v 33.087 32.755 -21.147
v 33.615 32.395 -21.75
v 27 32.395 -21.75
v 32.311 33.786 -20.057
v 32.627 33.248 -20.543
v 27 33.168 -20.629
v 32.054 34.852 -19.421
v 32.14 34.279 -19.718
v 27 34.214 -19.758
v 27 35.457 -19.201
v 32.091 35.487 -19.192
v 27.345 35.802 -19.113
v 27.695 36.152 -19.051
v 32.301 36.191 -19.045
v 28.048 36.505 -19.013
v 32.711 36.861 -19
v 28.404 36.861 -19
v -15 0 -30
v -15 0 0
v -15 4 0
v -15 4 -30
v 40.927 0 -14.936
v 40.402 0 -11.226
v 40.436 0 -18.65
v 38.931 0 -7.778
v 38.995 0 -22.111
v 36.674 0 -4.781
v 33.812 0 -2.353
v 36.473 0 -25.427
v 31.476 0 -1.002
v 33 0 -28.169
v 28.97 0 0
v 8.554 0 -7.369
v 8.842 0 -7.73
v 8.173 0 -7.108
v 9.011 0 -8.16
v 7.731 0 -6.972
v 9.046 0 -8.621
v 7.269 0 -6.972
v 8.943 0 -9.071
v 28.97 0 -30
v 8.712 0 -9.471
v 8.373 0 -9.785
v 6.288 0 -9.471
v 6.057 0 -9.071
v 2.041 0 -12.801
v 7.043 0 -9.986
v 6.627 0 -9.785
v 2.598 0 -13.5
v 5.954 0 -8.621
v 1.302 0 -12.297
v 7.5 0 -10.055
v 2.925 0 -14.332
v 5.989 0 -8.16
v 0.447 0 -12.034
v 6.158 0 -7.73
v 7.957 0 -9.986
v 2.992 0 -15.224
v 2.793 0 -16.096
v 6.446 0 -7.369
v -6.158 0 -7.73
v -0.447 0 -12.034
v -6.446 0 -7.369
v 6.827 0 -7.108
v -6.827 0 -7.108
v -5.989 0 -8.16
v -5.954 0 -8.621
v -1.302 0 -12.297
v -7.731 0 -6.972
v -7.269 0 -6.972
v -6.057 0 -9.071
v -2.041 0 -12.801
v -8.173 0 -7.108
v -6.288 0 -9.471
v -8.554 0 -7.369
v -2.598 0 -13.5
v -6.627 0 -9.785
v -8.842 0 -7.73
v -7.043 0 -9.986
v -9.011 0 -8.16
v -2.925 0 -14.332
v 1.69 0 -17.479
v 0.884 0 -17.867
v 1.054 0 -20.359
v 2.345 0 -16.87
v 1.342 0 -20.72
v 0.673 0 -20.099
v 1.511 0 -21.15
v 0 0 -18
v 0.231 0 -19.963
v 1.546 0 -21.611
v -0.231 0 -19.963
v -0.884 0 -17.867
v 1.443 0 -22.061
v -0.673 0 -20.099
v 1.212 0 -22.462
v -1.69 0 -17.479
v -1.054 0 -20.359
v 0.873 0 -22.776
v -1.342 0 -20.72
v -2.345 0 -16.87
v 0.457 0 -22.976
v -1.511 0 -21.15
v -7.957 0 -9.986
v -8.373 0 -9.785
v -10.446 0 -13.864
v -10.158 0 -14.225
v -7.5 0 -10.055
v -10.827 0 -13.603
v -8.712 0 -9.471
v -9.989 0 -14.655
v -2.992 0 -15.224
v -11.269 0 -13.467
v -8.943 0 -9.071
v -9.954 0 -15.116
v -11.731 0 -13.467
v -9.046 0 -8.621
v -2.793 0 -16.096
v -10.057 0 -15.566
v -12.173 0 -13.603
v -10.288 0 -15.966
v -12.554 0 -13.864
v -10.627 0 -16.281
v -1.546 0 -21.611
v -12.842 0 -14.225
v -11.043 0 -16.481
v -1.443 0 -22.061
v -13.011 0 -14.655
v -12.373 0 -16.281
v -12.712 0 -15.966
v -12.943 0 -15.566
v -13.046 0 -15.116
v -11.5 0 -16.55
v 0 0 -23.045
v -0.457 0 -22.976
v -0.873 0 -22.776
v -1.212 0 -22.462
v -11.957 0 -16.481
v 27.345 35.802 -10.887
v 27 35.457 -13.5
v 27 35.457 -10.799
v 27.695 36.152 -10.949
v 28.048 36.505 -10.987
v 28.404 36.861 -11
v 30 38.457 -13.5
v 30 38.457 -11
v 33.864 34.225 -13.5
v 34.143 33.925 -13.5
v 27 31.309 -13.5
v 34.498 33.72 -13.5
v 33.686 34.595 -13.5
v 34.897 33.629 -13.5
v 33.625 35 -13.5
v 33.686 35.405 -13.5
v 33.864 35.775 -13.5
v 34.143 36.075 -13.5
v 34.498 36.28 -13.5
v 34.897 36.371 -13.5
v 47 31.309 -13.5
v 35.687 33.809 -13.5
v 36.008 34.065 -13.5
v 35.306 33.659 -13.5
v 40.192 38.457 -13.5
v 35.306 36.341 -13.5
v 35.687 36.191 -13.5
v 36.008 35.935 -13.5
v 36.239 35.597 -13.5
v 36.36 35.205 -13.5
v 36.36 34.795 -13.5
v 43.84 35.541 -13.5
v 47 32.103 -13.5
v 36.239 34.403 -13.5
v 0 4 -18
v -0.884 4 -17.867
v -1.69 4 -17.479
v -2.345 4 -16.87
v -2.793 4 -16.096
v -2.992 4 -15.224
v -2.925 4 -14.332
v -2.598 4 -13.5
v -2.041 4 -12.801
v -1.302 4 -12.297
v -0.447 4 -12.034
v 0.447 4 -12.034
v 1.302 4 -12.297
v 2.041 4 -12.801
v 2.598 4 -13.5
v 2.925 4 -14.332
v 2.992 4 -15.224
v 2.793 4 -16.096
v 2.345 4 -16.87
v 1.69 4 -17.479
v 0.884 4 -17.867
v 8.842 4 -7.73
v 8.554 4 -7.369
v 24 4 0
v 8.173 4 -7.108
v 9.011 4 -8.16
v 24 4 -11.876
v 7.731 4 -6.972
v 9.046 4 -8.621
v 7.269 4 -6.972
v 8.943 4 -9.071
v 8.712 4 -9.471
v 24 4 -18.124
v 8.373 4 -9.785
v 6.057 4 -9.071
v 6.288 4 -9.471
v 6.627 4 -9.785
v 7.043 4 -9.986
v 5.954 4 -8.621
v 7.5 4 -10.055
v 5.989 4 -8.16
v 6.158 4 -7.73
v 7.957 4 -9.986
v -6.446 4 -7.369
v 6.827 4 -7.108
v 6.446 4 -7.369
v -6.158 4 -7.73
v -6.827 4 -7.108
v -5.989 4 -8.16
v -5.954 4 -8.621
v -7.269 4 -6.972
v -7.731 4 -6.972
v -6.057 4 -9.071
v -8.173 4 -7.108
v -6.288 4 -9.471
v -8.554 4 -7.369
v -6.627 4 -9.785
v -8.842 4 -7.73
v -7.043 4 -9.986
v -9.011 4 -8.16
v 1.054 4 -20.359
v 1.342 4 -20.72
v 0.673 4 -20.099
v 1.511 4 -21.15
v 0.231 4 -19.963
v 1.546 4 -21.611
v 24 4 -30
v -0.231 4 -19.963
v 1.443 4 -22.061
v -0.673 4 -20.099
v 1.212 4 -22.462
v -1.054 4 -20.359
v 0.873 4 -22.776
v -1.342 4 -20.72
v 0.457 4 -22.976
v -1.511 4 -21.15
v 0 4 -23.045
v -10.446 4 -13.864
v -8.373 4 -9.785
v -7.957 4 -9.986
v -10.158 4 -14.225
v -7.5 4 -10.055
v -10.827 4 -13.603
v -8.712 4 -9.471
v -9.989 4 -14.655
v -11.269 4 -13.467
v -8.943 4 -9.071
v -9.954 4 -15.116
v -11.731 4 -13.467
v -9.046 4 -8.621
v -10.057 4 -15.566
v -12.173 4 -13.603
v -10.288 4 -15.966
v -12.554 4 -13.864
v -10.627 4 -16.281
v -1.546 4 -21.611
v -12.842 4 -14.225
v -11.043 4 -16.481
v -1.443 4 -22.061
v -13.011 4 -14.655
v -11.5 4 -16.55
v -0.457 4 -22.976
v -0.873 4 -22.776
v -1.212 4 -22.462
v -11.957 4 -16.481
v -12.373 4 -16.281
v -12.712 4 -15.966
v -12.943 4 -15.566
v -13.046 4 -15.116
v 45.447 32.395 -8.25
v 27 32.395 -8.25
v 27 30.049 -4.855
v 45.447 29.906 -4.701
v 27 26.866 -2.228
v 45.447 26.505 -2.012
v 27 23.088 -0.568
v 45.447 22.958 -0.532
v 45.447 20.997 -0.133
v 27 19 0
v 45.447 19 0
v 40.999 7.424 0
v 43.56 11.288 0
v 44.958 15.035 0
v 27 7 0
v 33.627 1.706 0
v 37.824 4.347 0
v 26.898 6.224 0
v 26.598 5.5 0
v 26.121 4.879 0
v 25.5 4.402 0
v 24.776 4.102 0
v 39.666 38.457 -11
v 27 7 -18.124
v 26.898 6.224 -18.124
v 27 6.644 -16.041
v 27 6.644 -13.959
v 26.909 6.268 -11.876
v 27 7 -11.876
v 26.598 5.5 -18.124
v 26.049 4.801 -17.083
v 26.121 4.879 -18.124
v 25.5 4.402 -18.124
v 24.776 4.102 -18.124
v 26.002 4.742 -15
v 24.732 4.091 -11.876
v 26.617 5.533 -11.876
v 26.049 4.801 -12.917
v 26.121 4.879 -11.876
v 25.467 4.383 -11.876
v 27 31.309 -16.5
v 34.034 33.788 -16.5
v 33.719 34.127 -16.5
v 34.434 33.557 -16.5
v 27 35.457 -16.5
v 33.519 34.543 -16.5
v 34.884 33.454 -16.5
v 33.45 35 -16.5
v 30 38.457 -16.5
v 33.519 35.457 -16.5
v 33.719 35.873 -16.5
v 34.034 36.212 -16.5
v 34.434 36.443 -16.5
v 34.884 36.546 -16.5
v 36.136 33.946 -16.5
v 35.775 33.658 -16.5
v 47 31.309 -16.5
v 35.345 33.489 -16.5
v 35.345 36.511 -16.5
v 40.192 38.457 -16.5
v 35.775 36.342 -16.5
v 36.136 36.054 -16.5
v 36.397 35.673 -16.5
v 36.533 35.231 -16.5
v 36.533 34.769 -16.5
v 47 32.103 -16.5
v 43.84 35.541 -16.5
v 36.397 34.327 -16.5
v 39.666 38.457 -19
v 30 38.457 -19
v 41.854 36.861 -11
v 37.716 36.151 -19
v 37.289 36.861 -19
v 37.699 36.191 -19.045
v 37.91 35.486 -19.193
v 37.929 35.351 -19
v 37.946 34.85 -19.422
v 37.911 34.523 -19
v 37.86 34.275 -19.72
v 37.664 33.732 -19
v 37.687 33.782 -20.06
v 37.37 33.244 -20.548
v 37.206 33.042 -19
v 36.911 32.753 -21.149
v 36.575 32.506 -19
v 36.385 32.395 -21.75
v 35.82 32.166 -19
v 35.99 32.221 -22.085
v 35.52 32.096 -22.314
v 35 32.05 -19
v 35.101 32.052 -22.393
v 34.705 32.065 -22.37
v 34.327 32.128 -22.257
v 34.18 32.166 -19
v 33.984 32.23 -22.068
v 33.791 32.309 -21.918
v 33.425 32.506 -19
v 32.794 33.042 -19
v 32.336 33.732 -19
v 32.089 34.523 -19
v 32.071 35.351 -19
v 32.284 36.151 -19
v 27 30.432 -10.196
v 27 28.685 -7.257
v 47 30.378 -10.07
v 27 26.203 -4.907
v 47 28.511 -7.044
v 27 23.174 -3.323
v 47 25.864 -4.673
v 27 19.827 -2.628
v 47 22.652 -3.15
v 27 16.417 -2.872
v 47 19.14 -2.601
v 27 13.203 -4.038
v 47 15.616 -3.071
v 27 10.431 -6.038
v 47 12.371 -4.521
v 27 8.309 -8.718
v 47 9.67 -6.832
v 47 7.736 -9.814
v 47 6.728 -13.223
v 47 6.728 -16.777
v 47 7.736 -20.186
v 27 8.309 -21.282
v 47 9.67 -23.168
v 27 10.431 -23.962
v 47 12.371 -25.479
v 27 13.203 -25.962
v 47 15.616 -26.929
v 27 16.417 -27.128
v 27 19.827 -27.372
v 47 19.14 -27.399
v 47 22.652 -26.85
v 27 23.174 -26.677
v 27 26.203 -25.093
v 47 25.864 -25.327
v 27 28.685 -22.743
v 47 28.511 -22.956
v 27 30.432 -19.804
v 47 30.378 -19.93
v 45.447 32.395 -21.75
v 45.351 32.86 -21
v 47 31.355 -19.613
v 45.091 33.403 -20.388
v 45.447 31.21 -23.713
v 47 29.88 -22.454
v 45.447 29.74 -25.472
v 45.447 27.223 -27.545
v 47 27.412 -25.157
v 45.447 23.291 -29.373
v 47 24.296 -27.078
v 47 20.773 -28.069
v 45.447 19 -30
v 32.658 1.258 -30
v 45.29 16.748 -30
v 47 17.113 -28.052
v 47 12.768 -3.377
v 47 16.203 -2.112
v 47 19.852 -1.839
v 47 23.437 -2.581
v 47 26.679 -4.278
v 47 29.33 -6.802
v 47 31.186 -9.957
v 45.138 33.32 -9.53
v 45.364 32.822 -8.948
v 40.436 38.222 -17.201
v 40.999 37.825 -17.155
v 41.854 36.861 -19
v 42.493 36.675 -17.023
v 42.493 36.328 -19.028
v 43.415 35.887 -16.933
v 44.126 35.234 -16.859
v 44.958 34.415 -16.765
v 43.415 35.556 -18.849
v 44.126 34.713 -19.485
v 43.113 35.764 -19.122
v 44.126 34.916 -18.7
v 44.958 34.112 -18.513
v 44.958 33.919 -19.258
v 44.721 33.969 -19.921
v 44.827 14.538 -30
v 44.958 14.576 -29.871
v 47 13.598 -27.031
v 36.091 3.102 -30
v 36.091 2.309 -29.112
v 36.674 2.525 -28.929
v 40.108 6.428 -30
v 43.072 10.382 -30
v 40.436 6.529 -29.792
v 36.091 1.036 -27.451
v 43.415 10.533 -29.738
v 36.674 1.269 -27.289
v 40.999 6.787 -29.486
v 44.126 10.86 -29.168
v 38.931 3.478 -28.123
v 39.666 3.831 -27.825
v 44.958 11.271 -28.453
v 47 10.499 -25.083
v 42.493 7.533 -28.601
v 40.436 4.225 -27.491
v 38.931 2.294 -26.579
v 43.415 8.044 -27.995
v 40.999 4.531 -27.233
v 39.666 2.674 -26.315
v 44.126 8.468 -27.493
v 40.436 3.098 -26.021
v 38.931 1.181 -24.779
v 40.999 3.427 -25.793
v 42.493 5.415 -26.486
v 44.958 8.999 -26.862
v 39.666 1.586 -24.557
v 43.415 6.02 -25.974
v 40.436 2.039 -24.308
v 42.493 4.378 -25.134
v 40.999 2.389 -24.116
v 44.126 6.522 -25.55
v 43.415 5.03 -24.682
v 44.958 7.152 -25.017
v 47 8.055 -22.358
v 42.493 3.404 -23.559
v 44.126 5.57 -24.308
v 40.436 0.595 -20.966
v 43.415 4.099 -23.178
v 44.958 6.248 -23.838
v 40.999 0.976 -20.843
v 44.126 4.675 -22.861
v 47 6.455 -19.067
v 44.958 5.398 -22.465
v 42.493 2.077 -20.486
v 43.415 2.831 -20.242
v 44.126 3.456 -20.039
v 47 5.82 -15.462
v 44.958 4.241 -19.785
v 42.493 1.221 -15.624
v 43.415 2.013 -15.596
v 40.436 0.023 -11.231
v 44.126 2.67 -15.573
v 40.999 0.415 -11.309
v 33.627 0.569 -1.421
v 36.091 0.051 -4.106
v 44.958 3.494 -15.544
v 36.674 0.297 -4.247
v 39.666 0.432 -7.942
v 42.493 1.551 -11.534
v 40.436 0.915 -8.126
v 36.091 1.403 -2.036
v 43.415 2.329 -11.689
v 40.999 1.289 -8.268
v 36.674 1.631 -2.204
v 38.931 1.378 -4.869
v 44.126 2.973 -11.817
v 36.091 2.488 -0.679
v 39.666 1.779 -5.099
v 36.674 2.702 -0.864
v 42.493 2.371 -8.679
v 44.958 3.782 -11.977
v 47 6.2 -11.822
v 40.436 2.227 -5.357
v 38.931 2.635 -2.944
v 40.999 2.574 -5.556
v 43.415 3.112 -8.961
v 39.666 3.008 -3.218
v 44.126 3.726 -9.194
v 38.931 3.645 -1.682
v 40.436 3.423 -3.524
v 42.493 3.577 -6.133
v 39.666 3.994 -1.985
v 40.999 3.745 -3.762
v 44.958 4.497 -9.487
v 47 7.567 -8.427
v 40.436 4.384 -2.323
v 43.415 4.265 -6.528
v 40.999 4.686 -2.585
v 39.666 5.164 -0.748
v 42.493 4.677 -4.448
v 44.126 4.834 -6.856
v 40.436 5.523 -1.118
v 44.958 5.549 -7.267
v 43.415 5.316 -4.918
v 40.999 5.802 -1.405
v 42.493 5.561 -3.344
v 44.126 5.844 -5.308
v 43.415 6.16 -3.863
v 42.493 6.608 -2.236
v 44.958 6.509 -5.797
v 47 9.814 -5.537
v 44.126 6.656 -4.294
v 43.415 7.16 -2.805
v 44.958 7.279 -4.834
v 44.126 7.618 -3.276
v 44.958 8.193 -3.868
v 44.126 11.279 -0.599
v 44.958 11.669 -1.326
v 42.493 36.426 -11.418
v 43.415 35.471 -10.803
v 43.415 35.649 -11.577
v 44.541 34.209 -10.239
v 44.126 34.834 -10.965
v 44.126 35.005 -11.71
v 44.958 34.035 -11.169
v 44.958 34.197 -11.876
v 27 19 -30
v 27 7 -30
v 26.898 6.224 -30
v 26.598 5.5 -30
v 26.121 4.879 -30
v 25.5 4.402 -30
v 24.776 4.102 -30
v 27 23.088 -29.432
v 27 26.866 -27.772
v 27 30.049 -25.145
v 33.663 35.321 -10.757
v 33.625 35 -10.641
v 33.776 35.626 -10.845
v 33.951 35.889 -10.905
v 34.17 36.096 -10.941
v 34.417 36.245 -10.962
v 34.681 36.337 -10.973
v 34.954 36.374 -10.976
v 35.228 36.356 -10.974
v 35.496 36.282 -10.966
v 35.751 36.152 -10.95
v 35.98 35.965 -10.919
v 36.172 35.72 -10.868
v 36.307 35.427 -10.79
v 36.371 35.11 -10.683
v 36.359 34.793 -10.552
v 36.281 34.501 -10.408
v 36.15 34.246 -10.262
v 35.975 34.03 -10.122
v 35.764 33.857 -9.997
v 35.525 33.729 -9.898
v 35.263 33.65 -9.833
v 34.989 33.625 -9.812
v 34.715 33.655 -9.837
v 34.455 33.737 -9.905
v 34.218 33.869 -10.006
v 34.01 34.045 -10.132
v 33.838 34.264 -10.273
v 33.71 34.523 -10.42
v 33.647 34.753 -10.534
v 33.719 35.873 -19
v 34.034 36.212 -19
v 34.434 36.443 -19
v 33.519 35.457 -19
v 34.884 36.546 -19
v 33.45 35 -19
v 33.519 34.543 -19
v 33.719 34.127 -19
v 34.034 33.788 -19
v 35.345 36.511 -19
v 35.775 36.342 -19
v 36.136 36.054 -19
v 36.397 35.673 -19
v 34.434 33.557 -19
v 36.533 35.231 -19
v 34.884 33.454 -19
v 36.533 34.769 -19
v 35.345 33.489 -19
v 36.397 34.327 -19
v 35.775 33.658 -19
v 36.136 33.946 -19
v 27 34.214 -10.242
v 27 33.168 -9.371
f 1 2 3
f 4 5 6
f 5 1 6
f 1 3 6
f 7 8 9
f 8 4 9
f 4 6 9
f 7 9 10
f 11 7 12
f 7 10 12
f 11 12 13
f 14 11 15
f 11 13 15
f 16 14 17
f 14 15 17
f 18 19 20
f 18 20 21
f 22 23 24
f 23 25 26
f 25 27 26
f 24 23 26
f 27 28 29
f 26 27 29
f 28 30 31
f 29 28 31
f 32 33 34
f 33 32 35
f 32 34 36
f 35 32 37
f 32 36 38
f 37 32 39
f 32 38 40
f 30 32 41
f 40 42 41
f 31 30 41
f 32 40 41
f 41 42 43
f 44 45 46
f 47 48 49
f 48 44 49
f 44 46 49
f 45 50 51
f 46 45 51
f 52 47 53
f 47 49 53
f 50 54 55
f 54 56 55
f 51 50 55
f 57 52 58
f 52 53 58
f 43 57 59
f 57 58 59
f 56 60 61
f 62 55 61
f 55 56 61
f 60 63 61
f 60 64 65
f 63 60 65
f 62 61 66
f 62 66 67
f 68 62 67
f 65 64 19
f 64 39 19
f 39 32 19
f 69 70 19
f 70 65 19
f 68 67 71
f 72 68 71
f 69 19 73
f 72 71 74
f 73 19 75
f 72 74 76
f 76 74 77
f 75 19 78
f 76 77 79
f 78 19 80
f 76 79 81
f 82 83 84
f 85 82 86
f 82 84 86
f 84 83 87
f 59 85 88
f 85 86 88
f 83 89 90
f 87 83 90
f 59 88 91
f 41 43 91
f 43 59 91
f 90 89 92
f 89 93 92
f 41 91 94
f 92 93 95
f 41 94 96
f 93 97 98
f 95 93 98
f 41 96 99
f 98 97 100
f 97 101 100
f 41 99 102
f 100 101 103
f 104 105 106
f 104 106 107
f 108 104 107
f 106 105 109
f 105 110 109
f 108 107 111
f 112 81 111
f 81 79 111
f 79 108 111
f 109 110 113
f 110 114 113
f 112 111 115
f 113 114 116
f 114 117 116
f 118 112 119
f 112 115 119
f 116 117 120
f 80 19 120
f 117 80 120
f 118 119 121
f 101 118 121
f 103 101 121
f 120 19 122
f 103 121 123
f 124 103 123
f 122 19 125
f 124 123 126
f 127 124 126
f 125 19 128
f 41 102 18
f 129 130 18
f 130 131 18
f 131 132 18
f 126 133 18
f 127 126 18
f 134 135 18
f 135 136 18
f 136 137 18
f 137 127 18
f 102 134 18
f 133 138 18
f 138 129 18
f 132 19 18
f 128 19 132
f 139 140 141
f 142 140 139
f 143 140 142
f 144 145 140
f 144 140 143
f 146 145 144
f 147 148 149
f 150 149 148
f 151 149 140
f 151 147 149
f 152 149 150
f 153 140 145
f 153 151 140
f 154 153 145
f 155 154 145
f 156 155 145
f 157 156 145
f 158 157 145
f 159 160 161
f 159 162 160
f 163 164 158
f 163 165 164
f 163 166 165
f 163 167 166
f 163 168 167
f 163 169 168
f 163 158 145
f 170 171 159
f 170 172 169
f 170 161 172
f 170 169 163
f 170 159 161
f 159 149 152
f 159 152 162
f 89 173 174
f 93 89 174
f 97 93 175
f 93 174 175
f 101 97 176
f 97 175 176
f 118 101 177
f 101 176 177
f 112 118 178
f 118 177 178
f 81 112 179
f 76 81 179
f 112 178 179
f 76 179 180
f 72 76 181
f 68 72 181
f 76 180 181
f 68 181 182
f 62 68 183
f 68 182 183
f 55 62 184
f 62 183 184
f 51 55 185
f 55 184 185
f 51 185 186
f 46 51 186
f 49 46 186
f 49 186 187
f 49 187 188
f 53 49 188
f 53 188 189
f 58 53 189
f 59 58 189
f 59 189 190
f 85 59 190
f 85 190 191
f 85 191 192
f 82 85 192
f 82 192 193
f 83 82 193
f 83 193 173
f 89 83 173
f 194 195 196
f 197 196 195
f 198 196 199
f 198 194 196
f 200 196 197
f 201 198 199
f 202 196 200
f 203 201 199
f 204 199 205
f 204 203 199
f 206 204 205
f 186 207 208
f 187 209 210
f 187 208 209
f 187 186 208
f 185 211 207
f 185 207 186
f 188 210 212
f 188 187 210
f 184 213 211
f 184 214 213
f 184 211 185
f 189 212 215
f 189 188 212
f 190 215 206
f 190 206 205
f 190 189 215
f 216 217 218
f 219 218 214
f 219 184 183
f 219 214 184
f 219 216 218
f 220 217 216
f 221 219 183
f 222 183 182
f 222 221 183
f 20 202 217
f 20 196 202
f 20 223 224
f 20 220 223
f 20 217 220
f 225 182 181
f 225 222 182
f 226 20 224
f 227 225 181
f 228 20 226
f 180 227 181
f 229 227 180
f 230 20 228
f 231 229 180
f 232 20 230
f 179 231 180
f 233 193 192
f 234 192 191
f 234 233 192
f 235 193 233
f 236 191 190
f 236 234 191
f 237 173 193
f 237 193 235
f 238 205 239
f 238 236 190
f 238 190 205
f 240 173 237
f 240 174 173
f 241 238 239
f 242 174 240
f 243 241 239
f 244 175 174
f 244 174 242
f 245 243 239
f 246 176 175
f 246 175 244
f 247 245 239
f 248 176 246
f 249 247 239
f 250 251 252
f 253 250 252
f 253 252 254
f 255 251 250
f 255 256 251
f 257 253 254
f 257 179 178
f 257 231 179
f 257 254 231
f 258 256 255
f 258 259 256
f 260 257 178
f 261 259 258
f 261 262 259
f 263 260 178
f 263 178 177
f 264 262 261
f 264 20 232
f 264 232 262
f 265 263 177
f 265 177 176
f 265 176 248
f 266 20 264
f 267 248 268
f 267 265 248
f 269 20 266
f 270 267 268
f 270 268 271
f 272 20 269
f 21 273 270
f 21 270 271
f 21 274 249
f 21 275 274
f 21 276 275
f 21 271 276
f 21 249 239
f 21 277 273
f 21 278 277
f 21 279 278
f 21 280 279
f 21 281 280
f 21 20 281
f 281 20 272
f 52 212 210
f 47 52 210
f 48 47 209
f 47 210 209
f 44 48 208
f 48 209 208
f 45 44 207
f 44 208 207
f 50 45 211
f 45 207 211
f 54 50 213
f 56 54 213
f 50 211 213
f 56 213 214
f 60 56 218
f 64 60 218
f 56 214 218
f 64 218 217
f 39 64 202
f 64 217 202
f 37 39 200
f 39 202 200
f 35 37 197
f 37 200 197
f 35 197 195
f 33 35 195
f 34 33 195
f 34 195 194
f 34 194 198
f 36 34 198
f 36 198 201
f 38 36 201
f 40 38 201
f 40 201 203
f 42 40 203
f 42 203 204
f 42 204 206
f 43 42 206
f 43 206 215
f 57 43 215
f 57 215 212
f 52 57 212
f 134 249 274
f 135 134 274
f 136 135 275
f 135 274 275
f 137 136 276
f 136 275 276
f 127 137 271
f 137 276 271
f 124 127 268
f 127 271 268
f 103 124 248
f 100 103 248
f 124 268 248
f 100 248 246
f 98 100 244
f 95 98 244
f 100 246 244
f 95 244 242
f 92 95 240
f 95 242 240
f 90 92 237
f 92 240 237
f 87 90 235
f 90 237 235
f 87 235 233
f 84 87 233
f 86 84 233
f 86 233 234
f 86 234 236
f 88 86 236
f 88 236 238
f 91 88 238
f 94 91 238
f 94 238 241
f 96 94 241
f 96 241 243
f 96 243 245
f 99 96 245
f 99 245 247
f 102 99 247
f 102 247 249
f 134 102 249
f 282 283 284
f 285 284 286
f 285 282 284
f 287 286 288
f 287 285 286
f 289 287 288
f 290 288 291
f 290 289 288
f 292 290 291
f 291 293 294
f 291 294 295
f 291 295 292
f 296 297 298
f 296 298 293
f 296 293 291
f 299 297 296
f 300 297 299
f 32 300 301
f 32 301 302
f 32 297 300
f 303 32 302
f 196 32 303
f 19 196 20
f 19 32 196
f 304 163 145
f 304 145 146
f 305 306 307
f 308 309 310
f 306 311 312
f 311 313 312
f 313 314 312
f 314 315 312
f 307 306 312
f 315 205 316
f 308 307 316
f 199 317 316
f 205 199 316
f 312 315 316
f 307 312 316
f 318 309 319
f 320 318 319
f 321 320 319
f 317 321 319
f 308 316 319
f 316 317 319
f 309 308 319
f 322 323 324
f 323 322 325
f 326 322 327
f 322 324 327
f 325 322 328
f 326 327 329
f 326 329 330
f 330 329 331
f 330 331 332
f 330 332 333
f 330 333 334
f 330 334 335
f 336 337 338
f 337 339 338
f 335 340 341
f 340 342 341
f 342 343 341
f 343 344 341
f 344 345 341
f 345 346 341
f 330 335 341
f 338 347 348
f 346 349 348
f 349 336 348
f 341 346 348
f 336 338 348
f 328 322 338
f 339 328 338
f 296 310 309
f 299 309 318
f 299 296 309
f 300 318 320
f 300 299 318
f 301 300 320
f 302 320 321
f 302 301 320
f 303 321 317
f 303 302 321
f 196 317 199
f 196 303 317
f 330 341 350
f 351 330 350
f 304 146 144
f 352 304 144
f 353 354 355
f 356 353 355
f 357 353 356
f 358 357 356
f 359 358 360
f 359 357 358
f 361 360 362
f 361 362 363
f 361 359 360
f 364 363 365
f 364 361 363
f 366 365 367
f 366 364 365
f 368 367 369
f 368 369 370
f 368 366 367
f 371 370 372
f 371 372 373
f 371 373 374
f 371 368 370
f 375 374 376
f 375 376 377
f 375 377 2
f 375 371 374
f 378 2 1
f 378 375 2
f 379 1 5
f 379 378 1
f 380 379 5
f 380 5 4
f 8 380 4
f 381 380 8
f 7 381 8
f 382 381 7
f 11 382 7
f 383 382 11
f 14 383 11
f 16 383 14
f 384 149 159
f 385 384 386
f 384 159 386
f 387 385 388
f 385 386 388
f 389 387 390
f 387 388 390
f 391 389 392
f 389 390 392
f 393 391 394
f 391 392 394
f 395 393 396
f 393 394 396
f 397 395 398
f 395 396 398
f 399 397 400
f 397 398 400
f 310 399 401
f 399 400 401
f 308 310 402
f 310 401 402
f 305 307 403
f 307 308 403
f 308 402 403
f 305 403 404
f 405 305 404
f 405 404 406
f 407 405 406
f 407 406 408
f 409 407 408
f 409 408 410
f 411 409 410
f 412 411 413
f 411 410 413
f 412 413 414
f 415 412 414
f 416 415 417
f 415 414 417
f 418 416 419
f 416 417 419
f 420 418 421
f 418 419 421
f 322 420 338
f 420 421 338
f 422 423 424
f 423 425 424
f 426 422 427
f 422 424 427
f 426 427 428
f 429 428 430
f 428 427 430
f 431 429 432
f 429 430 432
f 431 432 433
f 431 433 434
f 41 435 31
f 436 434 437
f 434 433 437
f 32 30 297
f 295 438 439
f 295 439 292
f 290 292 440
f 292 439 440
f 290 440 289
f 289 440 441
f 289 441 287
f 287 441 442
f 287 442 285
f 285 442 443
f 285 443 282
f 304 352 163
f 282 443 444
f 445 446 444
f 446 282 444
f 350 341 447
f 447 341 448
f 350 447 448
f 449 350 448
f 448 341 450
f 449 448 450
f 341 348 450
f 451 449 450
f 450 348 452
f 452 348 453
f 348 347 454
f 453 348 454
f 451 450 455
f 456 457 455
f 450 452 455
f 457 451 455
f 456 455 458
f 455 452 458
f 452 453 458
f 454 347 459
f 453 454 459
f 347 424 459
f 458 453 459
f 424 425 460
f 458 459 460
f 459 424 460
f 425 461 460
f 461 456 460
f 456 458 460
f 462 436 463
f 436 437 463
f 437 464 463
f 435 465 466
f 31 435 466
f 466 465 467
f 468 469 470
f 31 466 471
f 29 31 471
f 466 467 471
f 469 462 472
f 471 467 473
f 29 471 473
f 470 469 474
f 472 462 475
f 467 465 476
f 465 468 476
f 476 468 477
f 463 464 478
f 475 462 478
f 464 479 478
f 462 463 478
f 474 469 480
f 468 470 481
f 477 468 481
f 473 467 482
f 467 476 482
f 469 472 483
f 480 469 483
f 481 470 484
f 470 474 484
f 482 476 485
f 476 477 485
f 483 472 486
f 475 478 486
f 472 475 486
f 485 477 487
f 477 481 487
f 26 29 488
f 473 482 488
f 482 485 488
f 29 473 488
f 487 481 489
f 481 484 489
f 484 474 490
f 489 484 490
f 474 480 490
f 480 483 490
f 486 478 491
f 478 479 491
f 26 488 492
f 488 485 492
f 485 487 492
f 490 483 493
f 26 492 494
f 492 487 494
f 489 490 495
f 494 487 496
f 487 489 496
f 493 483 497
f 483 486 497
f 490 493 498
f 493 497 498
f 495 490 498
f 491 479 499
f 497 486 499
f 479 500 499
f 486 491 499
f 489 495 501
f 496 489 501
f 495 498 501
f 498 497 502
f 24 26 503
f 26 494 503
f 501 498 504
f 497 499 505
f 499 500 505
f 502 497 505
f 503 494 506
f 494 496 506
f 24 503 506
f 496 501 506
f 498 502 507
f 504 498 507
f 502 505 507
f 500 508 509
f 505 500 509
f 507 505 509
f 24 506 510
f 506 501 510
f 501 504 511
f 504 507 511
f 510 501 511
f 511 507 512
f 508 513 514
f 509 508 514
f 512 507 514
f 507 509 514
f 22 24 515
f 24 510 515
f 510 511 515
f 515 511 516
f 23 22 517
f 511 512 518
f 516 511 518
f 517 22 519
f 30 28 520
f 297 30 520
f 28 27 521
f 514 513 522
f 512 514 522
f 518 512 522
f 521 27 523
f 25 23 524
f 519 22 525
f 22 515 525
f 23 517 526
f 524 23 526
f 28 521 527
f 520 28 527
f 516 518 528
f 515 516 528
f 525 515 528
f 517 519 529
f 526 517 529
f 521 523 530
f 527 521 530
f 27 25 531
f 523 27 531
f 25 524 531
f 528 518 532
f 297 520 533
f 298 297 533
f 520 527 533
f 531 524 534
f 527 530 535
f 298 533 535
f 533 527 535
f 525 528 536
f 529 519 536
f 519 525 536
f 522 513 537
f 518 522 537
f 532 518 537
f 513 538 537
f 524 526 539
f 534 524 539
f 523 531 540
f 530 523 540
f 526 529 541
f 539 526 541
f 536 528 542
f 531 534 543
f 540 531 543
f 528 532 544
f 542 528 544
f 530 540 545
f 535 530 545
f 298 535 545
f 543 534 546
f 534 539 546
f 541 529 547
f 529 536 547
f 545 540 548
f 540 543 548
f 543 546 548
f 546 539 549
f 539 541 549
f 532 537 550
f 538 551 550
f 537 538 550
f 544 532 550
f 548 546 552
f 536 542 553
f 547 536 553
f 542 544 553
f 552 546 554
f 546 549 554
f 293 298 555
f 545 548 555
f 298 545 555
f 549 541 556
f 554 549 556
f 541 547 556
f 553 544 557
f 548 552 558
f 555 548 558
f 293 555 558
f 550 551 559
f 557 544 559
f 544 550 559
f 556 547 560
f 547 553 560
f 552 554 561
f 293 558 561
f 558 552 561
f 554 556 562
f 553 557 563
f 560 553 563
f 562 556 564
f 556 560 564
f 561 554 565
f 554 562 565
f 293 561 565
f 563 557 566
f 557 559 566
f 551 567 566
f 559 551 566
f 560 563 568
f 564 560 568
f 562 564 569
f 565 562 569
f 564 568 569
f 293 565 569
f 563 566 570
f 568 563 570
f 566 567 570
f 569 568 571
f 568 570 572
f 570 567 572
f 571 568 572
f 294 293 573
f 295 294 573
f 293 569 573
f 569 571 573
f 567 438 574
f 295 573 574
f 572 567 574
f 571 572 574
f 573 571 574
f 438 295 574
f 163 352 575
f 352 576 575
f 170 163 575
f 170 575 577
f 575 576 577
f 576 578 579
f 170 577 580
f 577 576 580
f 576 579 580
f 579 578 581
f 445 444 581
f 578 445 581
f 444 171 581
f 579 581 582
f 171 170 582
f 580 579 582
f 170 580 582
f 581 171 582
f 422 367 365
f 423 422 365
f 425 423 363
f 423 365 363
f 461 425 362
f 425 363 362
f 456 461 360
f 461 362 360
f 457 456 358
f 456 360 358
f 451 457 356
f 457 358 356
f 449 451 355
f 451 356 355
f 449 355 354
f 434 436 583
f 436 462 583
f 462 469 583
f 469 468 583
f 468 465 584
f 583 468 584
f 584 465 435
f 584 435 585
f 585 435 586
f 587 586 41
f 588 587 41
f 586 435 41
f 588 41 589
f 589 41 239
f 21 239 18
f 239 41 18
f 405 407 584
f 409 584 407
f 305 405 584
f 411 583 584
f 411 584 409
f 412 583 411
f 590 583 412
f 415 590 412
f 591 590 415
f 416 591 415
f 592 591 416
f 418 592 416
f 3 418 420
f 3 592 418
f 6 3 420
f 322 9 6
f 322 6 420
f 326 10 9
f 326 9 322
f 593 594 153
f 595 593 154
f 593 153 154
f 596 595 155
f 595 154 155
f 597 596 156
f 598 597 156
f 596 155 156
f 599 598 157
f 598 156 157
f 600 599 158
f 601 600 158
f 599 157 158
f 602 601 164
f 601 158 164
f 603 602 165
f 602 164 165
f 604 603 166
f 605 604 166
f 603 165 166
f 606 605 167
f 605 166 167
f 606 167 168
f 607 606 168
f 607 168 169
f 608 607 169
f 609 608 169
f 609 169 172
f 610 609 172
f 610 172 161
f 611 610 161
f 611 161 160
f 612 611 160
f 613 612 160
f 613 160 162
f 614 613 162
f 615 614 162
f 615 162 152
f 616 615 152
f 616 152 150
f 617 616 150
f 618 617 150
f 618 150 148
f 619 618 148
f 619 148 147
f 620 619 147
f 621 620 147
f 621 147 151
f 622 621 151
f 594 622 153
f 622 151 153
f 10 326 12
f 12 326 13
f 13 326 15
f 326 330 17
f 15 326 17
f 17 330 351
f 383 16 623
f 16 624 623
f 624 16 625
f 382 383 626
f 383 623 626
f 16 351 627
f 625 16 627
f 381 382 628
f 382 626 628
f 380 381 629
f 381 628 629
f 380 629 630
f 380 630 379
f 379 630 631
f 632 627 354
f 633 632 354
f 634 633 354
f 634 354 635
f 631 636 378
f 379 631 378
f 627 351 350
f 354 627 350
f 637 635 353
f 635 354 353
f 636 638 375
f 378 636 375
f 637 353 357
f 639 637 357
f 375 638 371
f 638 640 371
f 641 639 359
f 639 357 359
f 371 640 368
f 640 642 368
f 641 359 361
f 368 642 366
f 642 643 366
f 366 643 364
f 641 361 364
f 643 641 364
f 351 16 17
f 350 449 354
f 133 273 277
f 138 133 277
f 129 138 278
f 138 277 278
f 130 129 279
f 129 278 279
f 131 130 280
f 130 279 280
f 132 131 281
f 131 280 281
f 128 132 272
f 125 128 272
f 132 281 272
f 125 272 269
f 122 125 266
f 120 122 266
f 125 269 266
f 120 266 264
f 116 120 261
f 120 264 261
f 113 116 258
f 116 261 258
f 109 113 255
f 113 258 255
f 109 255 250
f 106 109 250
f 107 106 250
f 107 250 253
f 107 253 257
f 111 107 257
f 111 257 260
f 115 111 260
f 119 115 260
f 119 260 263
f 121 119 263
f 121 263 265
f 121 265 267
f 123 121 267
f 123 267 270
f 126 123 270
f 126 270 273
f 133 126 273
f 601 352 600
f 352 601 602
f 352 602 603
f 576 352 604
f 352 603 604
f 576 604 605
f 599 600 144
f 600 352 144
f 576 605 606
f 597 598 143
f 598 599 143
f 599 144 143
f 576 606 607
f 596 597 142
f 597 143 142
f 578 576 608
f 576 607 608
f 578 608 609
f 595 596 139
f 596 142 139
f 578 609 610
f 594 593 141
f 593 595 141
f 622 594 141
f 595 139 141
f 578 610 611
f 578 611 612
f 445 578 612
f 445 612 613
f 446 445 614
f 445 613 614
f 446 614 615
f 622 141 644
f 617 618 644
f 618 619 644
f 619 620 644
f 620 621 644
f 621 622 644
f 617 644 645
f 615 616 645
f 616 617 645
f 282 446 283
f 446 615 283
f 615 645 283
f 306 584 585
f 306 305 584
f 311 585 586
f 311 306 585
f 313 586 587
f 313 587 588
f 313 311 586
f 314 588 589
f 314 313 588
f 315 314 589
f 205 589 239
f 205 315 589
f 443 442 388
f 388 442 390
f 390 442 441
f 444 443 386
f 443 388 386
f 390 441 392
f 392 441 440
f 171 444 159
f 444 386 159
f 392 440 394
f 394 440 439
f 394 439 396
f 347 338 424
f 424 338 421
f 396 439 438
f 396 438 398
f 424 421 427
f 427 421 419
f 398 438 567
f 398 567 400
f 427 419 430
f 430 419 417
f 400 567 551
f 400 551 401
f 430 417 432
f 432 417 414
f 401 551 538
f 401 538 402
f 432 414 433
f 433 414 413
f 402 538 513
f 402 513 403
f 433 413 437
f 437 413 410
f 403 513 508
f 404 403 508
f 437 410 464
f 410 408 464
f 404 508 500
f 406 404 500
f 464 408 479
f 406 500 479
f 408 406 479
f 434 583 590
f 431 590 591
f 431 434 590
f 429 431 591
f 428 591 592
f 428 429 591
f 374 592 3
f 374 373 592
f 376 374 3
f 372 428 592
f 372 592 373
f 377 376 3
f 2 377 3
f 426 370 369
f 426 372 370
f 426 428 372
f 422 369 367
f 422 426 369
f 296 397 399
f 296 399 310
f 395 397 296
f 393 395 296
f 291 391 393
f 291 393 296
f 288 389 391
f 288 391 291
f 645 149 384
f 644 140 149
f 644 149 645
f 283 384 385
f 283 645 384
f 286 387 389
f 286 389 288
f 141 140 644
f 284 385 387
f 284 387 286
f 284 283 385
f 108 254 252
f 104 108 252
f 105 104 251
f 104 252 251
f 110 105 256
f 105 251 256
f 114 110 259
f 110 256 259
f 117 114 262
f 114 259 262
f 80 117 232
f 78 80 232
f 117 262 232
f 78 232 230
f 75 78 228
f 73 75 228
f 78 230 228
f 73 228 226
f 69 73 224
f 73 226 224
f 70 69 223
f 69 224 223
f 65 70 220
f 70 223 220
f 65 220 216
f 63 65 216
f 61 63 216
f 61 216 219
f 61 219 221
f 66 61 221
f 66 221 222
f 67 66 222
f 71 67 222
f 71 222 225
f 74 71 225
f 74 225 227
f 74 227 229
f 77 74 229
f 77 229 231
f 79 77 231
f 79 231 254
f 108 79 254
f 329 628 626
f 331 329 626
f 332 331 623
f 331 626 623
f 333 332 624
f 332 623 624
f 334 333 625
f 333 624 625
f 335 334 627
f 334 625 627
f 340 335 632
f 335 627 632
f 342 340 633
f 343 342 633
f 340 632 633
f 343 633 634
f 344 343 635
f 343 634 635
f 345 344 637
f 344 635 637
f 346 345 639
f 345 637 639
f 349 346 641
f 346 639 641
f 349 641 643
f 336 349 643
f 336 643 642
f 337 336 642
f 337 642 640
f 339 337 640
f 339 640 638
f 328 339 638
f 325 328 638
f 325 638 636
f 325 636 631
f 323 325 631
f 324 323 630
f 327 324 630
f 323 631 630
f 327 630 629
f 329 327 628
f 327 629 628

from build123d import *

# Parameters (mm, degrees)
SKETCH074_W             = 30
SKETCH074_H             = 62
PAD034_DEPTH            = 4
PAD084_DEPTH            = 20
SKETCH164_R             = 1.55
POCKET003_DEPTH         = 5
CHAMFER_SIZE            = 3
FILLET_R                = 3
FILLET001_R             = 5
SKETCH_R                = 1.375
POCKET_DEPTH            = 19.001
POCKET_DEPTH_BACK       = -11.001
SKETCH166_R             = 2.95
POCKET004_DEPTH         = 5
SKETCH167_R             = 1.55
POCKET005_DEPTH         = 2.5
SKETCH168_R             = 3
POCKET006_DEPTH         = 5
BODY010_PITCH_ANGLE     = 90
BODY010_PLACEMENT_ANGLE = -180


with BuildPart() as part:
    # Sketch074 → Pad034 (new body)
    with BuildSketch(Plane.XZ):
        with Locations((15, -16)):
            Rectangle(SKETCH074_W, SKETCH074_H)
    extrude(amount=PAD034_DEPTH)

    # Sketch160 (on Face3 of Pad034) → Pad084 (join)
    with BuildSketch(Plane(origin=(0, 0, -47), x_dir=(1, 0, 0), z_dir=(0, 0, -1))):
        with BuildLine():
            Line((0, 0), (0, 19))
            ThreePointArc((11, 33.456832), (3.062664, 28.082951), (0, 19))
            Line((11, 38.456832), (11, 33.456832))
            Line((13.5, 38.456832), (11, 38.456832))
            Line((13.5, 31.30894), (13.5, 38.456832))
            ThreePointArc((13.5, 31.30894), (15, 6.6), (16.5, 31.30894))
            Line((16.5, 31.30894), (16.5, 38.456832))
            Line((16.5, 38.456832), (19, 38.456832))
            Line((19, 38.456832), (19, 33.456832))
            ThreePointArc((30, 19), (26.937336, 28.082951), (19, 33.456832))
            Line((30, 19), (30, 0))
            Line((30, 0), (0, 0))
        make_face()
    extrude(amount=-PAD084_DEPTH)

    # Sketch164 → Pocket003 (cut)
    with BuildSketch(Plane.XZ.offset(4)):
        with Locations((8.504809, 7.5)):
            Circle(SKETCH164_R)
        with Locations((8.504809, -7.5)):
            Circle(SKETCH164_R)
        with Locations((21.495191, 0)):
            Circle(SKETCH164_R)
        with Locations((15, 11.5)):
            Circle(SKETCH164_R)
    extrude(amount=-POCKET003_DEPTH, mode=Mode.SUBTRACT)

    # Sketch165 (on DatumPlane) → Groove (revolve, cut)
    with BuildSketch(Plane(origin=(15, 0, 0), x_dir=(0, 0, 1), z_dir=(1, 0, 0))):
        with BuildLine():
            Line((-51.816792, 23.505394), (-59.215083, 23.505394))
            Line((-59.215083, 23.505394), (-59.215083, 49.506645))
            Line((-59.215083, 49.506645), (-28.913541, 49.506645))
            Line((-28.913541, 49.506645), (-28.913541, 43.218523))
            ThreePointArc((-28.913541, 43.218523), (-42.969663, 36.387934), (-51.816792, 23.505394))
        make_face()
    revolve(axis=Axis((15, -19, 0), (0, 0, 1)), mode=Mode.SUBTRACT)

    # Chamfer
    chamfer_edges = [part.edges().sort_by_distance(p)[0] for p in [
        (17.75, -38.456832, -27),
        (12.25, -38.456832, -27),
    ]]
    chamfer(chamfer_edges, length=CHAMFER_SIZE)

    # Fillet
    fillet_edges = [part.edges().sort_by_distance(p)[0] for p in [
        (15, -4, -27),
    ]]
    fillet(fillet_edges, radius=FILLET_R)

    # Fillet001
    fillet001_edges = [part.edges().sort_by_distance(p)[0] for p in [
        (11, -33.456832, -36.223655),
        (19, -33.456832, -36.223655),
    ]]
    fillet(fillet001_edges, radius=FILLET001_R)

    # Sketch (on Face10 of Fillet001) → Pocket (cut, two sides)
    with BuildSketch(Plane(origin=(19, 0, 0), x_dir=(0, 0, 1), z_dir=(1, 0, 0))) as pocket_sk:
        with Locations((-35, 35)):
            Circle(SKETCH_R)
    extrude(amount=-POCKET_DEPTH, mode=Mode.SUBTRACT)
    extrude(pocket_sk.sketch, amount=-POCKET_DEPTH_BACK, mode=Mode.SUBTRACT)

    # Sketch166 (on Face10 of Pocket) → Pocket004 (cut)
    with BuildSketch(Plane(origin=(19, 0, 0), x_dir=(0, 0, 1), z_dir=(1, 0, 0))):
        with Locations((-35, 35)):
            Circle(SKETCH166_R)
    extrude(amount=POCKET004_DEPTH, mode=Mode.SUBTRACT)

    # Sketch167 (on Face23 of Pocket004) → Pocket005 (cut)
    with BuildSketch(Plane(origin=(19, 0, 0), x_dir=(0, 0, 1), z_dir=(1, 0, 0))):
        with Locations((-35, 35)):
            Circle(SKETCH167_R)
    extrude(amount=-POCKET005_DEPTH, mode=Mode.SUBTRACT)

    # Sketch168 (on Face17 of Pocket005) → Pocket006 (cut)
    with BuildSketch(Plane.XZ.offset(4)):
        with Locations((15, 0)):
            Circle(SKETCH168_R)
    extrude(amount=-POCKET006_DEPTH, mode=Mode.SUBTRACT)


with BuildPart() as part_1:
    # Body010 pitch: moved
    add(part.part.rotate(Axis((0, 0, 0), (0, 1, 0)), BODY010_PITCH_ANGLE))


with BuildPart() as part_2:
    # Body010 placement: moved
    add(part_1.part.rotate(Axis((0, 0, 0), (0, 0, 1)), BODY010_PLACEMENT_ANGLE))


solid = part_2.part
